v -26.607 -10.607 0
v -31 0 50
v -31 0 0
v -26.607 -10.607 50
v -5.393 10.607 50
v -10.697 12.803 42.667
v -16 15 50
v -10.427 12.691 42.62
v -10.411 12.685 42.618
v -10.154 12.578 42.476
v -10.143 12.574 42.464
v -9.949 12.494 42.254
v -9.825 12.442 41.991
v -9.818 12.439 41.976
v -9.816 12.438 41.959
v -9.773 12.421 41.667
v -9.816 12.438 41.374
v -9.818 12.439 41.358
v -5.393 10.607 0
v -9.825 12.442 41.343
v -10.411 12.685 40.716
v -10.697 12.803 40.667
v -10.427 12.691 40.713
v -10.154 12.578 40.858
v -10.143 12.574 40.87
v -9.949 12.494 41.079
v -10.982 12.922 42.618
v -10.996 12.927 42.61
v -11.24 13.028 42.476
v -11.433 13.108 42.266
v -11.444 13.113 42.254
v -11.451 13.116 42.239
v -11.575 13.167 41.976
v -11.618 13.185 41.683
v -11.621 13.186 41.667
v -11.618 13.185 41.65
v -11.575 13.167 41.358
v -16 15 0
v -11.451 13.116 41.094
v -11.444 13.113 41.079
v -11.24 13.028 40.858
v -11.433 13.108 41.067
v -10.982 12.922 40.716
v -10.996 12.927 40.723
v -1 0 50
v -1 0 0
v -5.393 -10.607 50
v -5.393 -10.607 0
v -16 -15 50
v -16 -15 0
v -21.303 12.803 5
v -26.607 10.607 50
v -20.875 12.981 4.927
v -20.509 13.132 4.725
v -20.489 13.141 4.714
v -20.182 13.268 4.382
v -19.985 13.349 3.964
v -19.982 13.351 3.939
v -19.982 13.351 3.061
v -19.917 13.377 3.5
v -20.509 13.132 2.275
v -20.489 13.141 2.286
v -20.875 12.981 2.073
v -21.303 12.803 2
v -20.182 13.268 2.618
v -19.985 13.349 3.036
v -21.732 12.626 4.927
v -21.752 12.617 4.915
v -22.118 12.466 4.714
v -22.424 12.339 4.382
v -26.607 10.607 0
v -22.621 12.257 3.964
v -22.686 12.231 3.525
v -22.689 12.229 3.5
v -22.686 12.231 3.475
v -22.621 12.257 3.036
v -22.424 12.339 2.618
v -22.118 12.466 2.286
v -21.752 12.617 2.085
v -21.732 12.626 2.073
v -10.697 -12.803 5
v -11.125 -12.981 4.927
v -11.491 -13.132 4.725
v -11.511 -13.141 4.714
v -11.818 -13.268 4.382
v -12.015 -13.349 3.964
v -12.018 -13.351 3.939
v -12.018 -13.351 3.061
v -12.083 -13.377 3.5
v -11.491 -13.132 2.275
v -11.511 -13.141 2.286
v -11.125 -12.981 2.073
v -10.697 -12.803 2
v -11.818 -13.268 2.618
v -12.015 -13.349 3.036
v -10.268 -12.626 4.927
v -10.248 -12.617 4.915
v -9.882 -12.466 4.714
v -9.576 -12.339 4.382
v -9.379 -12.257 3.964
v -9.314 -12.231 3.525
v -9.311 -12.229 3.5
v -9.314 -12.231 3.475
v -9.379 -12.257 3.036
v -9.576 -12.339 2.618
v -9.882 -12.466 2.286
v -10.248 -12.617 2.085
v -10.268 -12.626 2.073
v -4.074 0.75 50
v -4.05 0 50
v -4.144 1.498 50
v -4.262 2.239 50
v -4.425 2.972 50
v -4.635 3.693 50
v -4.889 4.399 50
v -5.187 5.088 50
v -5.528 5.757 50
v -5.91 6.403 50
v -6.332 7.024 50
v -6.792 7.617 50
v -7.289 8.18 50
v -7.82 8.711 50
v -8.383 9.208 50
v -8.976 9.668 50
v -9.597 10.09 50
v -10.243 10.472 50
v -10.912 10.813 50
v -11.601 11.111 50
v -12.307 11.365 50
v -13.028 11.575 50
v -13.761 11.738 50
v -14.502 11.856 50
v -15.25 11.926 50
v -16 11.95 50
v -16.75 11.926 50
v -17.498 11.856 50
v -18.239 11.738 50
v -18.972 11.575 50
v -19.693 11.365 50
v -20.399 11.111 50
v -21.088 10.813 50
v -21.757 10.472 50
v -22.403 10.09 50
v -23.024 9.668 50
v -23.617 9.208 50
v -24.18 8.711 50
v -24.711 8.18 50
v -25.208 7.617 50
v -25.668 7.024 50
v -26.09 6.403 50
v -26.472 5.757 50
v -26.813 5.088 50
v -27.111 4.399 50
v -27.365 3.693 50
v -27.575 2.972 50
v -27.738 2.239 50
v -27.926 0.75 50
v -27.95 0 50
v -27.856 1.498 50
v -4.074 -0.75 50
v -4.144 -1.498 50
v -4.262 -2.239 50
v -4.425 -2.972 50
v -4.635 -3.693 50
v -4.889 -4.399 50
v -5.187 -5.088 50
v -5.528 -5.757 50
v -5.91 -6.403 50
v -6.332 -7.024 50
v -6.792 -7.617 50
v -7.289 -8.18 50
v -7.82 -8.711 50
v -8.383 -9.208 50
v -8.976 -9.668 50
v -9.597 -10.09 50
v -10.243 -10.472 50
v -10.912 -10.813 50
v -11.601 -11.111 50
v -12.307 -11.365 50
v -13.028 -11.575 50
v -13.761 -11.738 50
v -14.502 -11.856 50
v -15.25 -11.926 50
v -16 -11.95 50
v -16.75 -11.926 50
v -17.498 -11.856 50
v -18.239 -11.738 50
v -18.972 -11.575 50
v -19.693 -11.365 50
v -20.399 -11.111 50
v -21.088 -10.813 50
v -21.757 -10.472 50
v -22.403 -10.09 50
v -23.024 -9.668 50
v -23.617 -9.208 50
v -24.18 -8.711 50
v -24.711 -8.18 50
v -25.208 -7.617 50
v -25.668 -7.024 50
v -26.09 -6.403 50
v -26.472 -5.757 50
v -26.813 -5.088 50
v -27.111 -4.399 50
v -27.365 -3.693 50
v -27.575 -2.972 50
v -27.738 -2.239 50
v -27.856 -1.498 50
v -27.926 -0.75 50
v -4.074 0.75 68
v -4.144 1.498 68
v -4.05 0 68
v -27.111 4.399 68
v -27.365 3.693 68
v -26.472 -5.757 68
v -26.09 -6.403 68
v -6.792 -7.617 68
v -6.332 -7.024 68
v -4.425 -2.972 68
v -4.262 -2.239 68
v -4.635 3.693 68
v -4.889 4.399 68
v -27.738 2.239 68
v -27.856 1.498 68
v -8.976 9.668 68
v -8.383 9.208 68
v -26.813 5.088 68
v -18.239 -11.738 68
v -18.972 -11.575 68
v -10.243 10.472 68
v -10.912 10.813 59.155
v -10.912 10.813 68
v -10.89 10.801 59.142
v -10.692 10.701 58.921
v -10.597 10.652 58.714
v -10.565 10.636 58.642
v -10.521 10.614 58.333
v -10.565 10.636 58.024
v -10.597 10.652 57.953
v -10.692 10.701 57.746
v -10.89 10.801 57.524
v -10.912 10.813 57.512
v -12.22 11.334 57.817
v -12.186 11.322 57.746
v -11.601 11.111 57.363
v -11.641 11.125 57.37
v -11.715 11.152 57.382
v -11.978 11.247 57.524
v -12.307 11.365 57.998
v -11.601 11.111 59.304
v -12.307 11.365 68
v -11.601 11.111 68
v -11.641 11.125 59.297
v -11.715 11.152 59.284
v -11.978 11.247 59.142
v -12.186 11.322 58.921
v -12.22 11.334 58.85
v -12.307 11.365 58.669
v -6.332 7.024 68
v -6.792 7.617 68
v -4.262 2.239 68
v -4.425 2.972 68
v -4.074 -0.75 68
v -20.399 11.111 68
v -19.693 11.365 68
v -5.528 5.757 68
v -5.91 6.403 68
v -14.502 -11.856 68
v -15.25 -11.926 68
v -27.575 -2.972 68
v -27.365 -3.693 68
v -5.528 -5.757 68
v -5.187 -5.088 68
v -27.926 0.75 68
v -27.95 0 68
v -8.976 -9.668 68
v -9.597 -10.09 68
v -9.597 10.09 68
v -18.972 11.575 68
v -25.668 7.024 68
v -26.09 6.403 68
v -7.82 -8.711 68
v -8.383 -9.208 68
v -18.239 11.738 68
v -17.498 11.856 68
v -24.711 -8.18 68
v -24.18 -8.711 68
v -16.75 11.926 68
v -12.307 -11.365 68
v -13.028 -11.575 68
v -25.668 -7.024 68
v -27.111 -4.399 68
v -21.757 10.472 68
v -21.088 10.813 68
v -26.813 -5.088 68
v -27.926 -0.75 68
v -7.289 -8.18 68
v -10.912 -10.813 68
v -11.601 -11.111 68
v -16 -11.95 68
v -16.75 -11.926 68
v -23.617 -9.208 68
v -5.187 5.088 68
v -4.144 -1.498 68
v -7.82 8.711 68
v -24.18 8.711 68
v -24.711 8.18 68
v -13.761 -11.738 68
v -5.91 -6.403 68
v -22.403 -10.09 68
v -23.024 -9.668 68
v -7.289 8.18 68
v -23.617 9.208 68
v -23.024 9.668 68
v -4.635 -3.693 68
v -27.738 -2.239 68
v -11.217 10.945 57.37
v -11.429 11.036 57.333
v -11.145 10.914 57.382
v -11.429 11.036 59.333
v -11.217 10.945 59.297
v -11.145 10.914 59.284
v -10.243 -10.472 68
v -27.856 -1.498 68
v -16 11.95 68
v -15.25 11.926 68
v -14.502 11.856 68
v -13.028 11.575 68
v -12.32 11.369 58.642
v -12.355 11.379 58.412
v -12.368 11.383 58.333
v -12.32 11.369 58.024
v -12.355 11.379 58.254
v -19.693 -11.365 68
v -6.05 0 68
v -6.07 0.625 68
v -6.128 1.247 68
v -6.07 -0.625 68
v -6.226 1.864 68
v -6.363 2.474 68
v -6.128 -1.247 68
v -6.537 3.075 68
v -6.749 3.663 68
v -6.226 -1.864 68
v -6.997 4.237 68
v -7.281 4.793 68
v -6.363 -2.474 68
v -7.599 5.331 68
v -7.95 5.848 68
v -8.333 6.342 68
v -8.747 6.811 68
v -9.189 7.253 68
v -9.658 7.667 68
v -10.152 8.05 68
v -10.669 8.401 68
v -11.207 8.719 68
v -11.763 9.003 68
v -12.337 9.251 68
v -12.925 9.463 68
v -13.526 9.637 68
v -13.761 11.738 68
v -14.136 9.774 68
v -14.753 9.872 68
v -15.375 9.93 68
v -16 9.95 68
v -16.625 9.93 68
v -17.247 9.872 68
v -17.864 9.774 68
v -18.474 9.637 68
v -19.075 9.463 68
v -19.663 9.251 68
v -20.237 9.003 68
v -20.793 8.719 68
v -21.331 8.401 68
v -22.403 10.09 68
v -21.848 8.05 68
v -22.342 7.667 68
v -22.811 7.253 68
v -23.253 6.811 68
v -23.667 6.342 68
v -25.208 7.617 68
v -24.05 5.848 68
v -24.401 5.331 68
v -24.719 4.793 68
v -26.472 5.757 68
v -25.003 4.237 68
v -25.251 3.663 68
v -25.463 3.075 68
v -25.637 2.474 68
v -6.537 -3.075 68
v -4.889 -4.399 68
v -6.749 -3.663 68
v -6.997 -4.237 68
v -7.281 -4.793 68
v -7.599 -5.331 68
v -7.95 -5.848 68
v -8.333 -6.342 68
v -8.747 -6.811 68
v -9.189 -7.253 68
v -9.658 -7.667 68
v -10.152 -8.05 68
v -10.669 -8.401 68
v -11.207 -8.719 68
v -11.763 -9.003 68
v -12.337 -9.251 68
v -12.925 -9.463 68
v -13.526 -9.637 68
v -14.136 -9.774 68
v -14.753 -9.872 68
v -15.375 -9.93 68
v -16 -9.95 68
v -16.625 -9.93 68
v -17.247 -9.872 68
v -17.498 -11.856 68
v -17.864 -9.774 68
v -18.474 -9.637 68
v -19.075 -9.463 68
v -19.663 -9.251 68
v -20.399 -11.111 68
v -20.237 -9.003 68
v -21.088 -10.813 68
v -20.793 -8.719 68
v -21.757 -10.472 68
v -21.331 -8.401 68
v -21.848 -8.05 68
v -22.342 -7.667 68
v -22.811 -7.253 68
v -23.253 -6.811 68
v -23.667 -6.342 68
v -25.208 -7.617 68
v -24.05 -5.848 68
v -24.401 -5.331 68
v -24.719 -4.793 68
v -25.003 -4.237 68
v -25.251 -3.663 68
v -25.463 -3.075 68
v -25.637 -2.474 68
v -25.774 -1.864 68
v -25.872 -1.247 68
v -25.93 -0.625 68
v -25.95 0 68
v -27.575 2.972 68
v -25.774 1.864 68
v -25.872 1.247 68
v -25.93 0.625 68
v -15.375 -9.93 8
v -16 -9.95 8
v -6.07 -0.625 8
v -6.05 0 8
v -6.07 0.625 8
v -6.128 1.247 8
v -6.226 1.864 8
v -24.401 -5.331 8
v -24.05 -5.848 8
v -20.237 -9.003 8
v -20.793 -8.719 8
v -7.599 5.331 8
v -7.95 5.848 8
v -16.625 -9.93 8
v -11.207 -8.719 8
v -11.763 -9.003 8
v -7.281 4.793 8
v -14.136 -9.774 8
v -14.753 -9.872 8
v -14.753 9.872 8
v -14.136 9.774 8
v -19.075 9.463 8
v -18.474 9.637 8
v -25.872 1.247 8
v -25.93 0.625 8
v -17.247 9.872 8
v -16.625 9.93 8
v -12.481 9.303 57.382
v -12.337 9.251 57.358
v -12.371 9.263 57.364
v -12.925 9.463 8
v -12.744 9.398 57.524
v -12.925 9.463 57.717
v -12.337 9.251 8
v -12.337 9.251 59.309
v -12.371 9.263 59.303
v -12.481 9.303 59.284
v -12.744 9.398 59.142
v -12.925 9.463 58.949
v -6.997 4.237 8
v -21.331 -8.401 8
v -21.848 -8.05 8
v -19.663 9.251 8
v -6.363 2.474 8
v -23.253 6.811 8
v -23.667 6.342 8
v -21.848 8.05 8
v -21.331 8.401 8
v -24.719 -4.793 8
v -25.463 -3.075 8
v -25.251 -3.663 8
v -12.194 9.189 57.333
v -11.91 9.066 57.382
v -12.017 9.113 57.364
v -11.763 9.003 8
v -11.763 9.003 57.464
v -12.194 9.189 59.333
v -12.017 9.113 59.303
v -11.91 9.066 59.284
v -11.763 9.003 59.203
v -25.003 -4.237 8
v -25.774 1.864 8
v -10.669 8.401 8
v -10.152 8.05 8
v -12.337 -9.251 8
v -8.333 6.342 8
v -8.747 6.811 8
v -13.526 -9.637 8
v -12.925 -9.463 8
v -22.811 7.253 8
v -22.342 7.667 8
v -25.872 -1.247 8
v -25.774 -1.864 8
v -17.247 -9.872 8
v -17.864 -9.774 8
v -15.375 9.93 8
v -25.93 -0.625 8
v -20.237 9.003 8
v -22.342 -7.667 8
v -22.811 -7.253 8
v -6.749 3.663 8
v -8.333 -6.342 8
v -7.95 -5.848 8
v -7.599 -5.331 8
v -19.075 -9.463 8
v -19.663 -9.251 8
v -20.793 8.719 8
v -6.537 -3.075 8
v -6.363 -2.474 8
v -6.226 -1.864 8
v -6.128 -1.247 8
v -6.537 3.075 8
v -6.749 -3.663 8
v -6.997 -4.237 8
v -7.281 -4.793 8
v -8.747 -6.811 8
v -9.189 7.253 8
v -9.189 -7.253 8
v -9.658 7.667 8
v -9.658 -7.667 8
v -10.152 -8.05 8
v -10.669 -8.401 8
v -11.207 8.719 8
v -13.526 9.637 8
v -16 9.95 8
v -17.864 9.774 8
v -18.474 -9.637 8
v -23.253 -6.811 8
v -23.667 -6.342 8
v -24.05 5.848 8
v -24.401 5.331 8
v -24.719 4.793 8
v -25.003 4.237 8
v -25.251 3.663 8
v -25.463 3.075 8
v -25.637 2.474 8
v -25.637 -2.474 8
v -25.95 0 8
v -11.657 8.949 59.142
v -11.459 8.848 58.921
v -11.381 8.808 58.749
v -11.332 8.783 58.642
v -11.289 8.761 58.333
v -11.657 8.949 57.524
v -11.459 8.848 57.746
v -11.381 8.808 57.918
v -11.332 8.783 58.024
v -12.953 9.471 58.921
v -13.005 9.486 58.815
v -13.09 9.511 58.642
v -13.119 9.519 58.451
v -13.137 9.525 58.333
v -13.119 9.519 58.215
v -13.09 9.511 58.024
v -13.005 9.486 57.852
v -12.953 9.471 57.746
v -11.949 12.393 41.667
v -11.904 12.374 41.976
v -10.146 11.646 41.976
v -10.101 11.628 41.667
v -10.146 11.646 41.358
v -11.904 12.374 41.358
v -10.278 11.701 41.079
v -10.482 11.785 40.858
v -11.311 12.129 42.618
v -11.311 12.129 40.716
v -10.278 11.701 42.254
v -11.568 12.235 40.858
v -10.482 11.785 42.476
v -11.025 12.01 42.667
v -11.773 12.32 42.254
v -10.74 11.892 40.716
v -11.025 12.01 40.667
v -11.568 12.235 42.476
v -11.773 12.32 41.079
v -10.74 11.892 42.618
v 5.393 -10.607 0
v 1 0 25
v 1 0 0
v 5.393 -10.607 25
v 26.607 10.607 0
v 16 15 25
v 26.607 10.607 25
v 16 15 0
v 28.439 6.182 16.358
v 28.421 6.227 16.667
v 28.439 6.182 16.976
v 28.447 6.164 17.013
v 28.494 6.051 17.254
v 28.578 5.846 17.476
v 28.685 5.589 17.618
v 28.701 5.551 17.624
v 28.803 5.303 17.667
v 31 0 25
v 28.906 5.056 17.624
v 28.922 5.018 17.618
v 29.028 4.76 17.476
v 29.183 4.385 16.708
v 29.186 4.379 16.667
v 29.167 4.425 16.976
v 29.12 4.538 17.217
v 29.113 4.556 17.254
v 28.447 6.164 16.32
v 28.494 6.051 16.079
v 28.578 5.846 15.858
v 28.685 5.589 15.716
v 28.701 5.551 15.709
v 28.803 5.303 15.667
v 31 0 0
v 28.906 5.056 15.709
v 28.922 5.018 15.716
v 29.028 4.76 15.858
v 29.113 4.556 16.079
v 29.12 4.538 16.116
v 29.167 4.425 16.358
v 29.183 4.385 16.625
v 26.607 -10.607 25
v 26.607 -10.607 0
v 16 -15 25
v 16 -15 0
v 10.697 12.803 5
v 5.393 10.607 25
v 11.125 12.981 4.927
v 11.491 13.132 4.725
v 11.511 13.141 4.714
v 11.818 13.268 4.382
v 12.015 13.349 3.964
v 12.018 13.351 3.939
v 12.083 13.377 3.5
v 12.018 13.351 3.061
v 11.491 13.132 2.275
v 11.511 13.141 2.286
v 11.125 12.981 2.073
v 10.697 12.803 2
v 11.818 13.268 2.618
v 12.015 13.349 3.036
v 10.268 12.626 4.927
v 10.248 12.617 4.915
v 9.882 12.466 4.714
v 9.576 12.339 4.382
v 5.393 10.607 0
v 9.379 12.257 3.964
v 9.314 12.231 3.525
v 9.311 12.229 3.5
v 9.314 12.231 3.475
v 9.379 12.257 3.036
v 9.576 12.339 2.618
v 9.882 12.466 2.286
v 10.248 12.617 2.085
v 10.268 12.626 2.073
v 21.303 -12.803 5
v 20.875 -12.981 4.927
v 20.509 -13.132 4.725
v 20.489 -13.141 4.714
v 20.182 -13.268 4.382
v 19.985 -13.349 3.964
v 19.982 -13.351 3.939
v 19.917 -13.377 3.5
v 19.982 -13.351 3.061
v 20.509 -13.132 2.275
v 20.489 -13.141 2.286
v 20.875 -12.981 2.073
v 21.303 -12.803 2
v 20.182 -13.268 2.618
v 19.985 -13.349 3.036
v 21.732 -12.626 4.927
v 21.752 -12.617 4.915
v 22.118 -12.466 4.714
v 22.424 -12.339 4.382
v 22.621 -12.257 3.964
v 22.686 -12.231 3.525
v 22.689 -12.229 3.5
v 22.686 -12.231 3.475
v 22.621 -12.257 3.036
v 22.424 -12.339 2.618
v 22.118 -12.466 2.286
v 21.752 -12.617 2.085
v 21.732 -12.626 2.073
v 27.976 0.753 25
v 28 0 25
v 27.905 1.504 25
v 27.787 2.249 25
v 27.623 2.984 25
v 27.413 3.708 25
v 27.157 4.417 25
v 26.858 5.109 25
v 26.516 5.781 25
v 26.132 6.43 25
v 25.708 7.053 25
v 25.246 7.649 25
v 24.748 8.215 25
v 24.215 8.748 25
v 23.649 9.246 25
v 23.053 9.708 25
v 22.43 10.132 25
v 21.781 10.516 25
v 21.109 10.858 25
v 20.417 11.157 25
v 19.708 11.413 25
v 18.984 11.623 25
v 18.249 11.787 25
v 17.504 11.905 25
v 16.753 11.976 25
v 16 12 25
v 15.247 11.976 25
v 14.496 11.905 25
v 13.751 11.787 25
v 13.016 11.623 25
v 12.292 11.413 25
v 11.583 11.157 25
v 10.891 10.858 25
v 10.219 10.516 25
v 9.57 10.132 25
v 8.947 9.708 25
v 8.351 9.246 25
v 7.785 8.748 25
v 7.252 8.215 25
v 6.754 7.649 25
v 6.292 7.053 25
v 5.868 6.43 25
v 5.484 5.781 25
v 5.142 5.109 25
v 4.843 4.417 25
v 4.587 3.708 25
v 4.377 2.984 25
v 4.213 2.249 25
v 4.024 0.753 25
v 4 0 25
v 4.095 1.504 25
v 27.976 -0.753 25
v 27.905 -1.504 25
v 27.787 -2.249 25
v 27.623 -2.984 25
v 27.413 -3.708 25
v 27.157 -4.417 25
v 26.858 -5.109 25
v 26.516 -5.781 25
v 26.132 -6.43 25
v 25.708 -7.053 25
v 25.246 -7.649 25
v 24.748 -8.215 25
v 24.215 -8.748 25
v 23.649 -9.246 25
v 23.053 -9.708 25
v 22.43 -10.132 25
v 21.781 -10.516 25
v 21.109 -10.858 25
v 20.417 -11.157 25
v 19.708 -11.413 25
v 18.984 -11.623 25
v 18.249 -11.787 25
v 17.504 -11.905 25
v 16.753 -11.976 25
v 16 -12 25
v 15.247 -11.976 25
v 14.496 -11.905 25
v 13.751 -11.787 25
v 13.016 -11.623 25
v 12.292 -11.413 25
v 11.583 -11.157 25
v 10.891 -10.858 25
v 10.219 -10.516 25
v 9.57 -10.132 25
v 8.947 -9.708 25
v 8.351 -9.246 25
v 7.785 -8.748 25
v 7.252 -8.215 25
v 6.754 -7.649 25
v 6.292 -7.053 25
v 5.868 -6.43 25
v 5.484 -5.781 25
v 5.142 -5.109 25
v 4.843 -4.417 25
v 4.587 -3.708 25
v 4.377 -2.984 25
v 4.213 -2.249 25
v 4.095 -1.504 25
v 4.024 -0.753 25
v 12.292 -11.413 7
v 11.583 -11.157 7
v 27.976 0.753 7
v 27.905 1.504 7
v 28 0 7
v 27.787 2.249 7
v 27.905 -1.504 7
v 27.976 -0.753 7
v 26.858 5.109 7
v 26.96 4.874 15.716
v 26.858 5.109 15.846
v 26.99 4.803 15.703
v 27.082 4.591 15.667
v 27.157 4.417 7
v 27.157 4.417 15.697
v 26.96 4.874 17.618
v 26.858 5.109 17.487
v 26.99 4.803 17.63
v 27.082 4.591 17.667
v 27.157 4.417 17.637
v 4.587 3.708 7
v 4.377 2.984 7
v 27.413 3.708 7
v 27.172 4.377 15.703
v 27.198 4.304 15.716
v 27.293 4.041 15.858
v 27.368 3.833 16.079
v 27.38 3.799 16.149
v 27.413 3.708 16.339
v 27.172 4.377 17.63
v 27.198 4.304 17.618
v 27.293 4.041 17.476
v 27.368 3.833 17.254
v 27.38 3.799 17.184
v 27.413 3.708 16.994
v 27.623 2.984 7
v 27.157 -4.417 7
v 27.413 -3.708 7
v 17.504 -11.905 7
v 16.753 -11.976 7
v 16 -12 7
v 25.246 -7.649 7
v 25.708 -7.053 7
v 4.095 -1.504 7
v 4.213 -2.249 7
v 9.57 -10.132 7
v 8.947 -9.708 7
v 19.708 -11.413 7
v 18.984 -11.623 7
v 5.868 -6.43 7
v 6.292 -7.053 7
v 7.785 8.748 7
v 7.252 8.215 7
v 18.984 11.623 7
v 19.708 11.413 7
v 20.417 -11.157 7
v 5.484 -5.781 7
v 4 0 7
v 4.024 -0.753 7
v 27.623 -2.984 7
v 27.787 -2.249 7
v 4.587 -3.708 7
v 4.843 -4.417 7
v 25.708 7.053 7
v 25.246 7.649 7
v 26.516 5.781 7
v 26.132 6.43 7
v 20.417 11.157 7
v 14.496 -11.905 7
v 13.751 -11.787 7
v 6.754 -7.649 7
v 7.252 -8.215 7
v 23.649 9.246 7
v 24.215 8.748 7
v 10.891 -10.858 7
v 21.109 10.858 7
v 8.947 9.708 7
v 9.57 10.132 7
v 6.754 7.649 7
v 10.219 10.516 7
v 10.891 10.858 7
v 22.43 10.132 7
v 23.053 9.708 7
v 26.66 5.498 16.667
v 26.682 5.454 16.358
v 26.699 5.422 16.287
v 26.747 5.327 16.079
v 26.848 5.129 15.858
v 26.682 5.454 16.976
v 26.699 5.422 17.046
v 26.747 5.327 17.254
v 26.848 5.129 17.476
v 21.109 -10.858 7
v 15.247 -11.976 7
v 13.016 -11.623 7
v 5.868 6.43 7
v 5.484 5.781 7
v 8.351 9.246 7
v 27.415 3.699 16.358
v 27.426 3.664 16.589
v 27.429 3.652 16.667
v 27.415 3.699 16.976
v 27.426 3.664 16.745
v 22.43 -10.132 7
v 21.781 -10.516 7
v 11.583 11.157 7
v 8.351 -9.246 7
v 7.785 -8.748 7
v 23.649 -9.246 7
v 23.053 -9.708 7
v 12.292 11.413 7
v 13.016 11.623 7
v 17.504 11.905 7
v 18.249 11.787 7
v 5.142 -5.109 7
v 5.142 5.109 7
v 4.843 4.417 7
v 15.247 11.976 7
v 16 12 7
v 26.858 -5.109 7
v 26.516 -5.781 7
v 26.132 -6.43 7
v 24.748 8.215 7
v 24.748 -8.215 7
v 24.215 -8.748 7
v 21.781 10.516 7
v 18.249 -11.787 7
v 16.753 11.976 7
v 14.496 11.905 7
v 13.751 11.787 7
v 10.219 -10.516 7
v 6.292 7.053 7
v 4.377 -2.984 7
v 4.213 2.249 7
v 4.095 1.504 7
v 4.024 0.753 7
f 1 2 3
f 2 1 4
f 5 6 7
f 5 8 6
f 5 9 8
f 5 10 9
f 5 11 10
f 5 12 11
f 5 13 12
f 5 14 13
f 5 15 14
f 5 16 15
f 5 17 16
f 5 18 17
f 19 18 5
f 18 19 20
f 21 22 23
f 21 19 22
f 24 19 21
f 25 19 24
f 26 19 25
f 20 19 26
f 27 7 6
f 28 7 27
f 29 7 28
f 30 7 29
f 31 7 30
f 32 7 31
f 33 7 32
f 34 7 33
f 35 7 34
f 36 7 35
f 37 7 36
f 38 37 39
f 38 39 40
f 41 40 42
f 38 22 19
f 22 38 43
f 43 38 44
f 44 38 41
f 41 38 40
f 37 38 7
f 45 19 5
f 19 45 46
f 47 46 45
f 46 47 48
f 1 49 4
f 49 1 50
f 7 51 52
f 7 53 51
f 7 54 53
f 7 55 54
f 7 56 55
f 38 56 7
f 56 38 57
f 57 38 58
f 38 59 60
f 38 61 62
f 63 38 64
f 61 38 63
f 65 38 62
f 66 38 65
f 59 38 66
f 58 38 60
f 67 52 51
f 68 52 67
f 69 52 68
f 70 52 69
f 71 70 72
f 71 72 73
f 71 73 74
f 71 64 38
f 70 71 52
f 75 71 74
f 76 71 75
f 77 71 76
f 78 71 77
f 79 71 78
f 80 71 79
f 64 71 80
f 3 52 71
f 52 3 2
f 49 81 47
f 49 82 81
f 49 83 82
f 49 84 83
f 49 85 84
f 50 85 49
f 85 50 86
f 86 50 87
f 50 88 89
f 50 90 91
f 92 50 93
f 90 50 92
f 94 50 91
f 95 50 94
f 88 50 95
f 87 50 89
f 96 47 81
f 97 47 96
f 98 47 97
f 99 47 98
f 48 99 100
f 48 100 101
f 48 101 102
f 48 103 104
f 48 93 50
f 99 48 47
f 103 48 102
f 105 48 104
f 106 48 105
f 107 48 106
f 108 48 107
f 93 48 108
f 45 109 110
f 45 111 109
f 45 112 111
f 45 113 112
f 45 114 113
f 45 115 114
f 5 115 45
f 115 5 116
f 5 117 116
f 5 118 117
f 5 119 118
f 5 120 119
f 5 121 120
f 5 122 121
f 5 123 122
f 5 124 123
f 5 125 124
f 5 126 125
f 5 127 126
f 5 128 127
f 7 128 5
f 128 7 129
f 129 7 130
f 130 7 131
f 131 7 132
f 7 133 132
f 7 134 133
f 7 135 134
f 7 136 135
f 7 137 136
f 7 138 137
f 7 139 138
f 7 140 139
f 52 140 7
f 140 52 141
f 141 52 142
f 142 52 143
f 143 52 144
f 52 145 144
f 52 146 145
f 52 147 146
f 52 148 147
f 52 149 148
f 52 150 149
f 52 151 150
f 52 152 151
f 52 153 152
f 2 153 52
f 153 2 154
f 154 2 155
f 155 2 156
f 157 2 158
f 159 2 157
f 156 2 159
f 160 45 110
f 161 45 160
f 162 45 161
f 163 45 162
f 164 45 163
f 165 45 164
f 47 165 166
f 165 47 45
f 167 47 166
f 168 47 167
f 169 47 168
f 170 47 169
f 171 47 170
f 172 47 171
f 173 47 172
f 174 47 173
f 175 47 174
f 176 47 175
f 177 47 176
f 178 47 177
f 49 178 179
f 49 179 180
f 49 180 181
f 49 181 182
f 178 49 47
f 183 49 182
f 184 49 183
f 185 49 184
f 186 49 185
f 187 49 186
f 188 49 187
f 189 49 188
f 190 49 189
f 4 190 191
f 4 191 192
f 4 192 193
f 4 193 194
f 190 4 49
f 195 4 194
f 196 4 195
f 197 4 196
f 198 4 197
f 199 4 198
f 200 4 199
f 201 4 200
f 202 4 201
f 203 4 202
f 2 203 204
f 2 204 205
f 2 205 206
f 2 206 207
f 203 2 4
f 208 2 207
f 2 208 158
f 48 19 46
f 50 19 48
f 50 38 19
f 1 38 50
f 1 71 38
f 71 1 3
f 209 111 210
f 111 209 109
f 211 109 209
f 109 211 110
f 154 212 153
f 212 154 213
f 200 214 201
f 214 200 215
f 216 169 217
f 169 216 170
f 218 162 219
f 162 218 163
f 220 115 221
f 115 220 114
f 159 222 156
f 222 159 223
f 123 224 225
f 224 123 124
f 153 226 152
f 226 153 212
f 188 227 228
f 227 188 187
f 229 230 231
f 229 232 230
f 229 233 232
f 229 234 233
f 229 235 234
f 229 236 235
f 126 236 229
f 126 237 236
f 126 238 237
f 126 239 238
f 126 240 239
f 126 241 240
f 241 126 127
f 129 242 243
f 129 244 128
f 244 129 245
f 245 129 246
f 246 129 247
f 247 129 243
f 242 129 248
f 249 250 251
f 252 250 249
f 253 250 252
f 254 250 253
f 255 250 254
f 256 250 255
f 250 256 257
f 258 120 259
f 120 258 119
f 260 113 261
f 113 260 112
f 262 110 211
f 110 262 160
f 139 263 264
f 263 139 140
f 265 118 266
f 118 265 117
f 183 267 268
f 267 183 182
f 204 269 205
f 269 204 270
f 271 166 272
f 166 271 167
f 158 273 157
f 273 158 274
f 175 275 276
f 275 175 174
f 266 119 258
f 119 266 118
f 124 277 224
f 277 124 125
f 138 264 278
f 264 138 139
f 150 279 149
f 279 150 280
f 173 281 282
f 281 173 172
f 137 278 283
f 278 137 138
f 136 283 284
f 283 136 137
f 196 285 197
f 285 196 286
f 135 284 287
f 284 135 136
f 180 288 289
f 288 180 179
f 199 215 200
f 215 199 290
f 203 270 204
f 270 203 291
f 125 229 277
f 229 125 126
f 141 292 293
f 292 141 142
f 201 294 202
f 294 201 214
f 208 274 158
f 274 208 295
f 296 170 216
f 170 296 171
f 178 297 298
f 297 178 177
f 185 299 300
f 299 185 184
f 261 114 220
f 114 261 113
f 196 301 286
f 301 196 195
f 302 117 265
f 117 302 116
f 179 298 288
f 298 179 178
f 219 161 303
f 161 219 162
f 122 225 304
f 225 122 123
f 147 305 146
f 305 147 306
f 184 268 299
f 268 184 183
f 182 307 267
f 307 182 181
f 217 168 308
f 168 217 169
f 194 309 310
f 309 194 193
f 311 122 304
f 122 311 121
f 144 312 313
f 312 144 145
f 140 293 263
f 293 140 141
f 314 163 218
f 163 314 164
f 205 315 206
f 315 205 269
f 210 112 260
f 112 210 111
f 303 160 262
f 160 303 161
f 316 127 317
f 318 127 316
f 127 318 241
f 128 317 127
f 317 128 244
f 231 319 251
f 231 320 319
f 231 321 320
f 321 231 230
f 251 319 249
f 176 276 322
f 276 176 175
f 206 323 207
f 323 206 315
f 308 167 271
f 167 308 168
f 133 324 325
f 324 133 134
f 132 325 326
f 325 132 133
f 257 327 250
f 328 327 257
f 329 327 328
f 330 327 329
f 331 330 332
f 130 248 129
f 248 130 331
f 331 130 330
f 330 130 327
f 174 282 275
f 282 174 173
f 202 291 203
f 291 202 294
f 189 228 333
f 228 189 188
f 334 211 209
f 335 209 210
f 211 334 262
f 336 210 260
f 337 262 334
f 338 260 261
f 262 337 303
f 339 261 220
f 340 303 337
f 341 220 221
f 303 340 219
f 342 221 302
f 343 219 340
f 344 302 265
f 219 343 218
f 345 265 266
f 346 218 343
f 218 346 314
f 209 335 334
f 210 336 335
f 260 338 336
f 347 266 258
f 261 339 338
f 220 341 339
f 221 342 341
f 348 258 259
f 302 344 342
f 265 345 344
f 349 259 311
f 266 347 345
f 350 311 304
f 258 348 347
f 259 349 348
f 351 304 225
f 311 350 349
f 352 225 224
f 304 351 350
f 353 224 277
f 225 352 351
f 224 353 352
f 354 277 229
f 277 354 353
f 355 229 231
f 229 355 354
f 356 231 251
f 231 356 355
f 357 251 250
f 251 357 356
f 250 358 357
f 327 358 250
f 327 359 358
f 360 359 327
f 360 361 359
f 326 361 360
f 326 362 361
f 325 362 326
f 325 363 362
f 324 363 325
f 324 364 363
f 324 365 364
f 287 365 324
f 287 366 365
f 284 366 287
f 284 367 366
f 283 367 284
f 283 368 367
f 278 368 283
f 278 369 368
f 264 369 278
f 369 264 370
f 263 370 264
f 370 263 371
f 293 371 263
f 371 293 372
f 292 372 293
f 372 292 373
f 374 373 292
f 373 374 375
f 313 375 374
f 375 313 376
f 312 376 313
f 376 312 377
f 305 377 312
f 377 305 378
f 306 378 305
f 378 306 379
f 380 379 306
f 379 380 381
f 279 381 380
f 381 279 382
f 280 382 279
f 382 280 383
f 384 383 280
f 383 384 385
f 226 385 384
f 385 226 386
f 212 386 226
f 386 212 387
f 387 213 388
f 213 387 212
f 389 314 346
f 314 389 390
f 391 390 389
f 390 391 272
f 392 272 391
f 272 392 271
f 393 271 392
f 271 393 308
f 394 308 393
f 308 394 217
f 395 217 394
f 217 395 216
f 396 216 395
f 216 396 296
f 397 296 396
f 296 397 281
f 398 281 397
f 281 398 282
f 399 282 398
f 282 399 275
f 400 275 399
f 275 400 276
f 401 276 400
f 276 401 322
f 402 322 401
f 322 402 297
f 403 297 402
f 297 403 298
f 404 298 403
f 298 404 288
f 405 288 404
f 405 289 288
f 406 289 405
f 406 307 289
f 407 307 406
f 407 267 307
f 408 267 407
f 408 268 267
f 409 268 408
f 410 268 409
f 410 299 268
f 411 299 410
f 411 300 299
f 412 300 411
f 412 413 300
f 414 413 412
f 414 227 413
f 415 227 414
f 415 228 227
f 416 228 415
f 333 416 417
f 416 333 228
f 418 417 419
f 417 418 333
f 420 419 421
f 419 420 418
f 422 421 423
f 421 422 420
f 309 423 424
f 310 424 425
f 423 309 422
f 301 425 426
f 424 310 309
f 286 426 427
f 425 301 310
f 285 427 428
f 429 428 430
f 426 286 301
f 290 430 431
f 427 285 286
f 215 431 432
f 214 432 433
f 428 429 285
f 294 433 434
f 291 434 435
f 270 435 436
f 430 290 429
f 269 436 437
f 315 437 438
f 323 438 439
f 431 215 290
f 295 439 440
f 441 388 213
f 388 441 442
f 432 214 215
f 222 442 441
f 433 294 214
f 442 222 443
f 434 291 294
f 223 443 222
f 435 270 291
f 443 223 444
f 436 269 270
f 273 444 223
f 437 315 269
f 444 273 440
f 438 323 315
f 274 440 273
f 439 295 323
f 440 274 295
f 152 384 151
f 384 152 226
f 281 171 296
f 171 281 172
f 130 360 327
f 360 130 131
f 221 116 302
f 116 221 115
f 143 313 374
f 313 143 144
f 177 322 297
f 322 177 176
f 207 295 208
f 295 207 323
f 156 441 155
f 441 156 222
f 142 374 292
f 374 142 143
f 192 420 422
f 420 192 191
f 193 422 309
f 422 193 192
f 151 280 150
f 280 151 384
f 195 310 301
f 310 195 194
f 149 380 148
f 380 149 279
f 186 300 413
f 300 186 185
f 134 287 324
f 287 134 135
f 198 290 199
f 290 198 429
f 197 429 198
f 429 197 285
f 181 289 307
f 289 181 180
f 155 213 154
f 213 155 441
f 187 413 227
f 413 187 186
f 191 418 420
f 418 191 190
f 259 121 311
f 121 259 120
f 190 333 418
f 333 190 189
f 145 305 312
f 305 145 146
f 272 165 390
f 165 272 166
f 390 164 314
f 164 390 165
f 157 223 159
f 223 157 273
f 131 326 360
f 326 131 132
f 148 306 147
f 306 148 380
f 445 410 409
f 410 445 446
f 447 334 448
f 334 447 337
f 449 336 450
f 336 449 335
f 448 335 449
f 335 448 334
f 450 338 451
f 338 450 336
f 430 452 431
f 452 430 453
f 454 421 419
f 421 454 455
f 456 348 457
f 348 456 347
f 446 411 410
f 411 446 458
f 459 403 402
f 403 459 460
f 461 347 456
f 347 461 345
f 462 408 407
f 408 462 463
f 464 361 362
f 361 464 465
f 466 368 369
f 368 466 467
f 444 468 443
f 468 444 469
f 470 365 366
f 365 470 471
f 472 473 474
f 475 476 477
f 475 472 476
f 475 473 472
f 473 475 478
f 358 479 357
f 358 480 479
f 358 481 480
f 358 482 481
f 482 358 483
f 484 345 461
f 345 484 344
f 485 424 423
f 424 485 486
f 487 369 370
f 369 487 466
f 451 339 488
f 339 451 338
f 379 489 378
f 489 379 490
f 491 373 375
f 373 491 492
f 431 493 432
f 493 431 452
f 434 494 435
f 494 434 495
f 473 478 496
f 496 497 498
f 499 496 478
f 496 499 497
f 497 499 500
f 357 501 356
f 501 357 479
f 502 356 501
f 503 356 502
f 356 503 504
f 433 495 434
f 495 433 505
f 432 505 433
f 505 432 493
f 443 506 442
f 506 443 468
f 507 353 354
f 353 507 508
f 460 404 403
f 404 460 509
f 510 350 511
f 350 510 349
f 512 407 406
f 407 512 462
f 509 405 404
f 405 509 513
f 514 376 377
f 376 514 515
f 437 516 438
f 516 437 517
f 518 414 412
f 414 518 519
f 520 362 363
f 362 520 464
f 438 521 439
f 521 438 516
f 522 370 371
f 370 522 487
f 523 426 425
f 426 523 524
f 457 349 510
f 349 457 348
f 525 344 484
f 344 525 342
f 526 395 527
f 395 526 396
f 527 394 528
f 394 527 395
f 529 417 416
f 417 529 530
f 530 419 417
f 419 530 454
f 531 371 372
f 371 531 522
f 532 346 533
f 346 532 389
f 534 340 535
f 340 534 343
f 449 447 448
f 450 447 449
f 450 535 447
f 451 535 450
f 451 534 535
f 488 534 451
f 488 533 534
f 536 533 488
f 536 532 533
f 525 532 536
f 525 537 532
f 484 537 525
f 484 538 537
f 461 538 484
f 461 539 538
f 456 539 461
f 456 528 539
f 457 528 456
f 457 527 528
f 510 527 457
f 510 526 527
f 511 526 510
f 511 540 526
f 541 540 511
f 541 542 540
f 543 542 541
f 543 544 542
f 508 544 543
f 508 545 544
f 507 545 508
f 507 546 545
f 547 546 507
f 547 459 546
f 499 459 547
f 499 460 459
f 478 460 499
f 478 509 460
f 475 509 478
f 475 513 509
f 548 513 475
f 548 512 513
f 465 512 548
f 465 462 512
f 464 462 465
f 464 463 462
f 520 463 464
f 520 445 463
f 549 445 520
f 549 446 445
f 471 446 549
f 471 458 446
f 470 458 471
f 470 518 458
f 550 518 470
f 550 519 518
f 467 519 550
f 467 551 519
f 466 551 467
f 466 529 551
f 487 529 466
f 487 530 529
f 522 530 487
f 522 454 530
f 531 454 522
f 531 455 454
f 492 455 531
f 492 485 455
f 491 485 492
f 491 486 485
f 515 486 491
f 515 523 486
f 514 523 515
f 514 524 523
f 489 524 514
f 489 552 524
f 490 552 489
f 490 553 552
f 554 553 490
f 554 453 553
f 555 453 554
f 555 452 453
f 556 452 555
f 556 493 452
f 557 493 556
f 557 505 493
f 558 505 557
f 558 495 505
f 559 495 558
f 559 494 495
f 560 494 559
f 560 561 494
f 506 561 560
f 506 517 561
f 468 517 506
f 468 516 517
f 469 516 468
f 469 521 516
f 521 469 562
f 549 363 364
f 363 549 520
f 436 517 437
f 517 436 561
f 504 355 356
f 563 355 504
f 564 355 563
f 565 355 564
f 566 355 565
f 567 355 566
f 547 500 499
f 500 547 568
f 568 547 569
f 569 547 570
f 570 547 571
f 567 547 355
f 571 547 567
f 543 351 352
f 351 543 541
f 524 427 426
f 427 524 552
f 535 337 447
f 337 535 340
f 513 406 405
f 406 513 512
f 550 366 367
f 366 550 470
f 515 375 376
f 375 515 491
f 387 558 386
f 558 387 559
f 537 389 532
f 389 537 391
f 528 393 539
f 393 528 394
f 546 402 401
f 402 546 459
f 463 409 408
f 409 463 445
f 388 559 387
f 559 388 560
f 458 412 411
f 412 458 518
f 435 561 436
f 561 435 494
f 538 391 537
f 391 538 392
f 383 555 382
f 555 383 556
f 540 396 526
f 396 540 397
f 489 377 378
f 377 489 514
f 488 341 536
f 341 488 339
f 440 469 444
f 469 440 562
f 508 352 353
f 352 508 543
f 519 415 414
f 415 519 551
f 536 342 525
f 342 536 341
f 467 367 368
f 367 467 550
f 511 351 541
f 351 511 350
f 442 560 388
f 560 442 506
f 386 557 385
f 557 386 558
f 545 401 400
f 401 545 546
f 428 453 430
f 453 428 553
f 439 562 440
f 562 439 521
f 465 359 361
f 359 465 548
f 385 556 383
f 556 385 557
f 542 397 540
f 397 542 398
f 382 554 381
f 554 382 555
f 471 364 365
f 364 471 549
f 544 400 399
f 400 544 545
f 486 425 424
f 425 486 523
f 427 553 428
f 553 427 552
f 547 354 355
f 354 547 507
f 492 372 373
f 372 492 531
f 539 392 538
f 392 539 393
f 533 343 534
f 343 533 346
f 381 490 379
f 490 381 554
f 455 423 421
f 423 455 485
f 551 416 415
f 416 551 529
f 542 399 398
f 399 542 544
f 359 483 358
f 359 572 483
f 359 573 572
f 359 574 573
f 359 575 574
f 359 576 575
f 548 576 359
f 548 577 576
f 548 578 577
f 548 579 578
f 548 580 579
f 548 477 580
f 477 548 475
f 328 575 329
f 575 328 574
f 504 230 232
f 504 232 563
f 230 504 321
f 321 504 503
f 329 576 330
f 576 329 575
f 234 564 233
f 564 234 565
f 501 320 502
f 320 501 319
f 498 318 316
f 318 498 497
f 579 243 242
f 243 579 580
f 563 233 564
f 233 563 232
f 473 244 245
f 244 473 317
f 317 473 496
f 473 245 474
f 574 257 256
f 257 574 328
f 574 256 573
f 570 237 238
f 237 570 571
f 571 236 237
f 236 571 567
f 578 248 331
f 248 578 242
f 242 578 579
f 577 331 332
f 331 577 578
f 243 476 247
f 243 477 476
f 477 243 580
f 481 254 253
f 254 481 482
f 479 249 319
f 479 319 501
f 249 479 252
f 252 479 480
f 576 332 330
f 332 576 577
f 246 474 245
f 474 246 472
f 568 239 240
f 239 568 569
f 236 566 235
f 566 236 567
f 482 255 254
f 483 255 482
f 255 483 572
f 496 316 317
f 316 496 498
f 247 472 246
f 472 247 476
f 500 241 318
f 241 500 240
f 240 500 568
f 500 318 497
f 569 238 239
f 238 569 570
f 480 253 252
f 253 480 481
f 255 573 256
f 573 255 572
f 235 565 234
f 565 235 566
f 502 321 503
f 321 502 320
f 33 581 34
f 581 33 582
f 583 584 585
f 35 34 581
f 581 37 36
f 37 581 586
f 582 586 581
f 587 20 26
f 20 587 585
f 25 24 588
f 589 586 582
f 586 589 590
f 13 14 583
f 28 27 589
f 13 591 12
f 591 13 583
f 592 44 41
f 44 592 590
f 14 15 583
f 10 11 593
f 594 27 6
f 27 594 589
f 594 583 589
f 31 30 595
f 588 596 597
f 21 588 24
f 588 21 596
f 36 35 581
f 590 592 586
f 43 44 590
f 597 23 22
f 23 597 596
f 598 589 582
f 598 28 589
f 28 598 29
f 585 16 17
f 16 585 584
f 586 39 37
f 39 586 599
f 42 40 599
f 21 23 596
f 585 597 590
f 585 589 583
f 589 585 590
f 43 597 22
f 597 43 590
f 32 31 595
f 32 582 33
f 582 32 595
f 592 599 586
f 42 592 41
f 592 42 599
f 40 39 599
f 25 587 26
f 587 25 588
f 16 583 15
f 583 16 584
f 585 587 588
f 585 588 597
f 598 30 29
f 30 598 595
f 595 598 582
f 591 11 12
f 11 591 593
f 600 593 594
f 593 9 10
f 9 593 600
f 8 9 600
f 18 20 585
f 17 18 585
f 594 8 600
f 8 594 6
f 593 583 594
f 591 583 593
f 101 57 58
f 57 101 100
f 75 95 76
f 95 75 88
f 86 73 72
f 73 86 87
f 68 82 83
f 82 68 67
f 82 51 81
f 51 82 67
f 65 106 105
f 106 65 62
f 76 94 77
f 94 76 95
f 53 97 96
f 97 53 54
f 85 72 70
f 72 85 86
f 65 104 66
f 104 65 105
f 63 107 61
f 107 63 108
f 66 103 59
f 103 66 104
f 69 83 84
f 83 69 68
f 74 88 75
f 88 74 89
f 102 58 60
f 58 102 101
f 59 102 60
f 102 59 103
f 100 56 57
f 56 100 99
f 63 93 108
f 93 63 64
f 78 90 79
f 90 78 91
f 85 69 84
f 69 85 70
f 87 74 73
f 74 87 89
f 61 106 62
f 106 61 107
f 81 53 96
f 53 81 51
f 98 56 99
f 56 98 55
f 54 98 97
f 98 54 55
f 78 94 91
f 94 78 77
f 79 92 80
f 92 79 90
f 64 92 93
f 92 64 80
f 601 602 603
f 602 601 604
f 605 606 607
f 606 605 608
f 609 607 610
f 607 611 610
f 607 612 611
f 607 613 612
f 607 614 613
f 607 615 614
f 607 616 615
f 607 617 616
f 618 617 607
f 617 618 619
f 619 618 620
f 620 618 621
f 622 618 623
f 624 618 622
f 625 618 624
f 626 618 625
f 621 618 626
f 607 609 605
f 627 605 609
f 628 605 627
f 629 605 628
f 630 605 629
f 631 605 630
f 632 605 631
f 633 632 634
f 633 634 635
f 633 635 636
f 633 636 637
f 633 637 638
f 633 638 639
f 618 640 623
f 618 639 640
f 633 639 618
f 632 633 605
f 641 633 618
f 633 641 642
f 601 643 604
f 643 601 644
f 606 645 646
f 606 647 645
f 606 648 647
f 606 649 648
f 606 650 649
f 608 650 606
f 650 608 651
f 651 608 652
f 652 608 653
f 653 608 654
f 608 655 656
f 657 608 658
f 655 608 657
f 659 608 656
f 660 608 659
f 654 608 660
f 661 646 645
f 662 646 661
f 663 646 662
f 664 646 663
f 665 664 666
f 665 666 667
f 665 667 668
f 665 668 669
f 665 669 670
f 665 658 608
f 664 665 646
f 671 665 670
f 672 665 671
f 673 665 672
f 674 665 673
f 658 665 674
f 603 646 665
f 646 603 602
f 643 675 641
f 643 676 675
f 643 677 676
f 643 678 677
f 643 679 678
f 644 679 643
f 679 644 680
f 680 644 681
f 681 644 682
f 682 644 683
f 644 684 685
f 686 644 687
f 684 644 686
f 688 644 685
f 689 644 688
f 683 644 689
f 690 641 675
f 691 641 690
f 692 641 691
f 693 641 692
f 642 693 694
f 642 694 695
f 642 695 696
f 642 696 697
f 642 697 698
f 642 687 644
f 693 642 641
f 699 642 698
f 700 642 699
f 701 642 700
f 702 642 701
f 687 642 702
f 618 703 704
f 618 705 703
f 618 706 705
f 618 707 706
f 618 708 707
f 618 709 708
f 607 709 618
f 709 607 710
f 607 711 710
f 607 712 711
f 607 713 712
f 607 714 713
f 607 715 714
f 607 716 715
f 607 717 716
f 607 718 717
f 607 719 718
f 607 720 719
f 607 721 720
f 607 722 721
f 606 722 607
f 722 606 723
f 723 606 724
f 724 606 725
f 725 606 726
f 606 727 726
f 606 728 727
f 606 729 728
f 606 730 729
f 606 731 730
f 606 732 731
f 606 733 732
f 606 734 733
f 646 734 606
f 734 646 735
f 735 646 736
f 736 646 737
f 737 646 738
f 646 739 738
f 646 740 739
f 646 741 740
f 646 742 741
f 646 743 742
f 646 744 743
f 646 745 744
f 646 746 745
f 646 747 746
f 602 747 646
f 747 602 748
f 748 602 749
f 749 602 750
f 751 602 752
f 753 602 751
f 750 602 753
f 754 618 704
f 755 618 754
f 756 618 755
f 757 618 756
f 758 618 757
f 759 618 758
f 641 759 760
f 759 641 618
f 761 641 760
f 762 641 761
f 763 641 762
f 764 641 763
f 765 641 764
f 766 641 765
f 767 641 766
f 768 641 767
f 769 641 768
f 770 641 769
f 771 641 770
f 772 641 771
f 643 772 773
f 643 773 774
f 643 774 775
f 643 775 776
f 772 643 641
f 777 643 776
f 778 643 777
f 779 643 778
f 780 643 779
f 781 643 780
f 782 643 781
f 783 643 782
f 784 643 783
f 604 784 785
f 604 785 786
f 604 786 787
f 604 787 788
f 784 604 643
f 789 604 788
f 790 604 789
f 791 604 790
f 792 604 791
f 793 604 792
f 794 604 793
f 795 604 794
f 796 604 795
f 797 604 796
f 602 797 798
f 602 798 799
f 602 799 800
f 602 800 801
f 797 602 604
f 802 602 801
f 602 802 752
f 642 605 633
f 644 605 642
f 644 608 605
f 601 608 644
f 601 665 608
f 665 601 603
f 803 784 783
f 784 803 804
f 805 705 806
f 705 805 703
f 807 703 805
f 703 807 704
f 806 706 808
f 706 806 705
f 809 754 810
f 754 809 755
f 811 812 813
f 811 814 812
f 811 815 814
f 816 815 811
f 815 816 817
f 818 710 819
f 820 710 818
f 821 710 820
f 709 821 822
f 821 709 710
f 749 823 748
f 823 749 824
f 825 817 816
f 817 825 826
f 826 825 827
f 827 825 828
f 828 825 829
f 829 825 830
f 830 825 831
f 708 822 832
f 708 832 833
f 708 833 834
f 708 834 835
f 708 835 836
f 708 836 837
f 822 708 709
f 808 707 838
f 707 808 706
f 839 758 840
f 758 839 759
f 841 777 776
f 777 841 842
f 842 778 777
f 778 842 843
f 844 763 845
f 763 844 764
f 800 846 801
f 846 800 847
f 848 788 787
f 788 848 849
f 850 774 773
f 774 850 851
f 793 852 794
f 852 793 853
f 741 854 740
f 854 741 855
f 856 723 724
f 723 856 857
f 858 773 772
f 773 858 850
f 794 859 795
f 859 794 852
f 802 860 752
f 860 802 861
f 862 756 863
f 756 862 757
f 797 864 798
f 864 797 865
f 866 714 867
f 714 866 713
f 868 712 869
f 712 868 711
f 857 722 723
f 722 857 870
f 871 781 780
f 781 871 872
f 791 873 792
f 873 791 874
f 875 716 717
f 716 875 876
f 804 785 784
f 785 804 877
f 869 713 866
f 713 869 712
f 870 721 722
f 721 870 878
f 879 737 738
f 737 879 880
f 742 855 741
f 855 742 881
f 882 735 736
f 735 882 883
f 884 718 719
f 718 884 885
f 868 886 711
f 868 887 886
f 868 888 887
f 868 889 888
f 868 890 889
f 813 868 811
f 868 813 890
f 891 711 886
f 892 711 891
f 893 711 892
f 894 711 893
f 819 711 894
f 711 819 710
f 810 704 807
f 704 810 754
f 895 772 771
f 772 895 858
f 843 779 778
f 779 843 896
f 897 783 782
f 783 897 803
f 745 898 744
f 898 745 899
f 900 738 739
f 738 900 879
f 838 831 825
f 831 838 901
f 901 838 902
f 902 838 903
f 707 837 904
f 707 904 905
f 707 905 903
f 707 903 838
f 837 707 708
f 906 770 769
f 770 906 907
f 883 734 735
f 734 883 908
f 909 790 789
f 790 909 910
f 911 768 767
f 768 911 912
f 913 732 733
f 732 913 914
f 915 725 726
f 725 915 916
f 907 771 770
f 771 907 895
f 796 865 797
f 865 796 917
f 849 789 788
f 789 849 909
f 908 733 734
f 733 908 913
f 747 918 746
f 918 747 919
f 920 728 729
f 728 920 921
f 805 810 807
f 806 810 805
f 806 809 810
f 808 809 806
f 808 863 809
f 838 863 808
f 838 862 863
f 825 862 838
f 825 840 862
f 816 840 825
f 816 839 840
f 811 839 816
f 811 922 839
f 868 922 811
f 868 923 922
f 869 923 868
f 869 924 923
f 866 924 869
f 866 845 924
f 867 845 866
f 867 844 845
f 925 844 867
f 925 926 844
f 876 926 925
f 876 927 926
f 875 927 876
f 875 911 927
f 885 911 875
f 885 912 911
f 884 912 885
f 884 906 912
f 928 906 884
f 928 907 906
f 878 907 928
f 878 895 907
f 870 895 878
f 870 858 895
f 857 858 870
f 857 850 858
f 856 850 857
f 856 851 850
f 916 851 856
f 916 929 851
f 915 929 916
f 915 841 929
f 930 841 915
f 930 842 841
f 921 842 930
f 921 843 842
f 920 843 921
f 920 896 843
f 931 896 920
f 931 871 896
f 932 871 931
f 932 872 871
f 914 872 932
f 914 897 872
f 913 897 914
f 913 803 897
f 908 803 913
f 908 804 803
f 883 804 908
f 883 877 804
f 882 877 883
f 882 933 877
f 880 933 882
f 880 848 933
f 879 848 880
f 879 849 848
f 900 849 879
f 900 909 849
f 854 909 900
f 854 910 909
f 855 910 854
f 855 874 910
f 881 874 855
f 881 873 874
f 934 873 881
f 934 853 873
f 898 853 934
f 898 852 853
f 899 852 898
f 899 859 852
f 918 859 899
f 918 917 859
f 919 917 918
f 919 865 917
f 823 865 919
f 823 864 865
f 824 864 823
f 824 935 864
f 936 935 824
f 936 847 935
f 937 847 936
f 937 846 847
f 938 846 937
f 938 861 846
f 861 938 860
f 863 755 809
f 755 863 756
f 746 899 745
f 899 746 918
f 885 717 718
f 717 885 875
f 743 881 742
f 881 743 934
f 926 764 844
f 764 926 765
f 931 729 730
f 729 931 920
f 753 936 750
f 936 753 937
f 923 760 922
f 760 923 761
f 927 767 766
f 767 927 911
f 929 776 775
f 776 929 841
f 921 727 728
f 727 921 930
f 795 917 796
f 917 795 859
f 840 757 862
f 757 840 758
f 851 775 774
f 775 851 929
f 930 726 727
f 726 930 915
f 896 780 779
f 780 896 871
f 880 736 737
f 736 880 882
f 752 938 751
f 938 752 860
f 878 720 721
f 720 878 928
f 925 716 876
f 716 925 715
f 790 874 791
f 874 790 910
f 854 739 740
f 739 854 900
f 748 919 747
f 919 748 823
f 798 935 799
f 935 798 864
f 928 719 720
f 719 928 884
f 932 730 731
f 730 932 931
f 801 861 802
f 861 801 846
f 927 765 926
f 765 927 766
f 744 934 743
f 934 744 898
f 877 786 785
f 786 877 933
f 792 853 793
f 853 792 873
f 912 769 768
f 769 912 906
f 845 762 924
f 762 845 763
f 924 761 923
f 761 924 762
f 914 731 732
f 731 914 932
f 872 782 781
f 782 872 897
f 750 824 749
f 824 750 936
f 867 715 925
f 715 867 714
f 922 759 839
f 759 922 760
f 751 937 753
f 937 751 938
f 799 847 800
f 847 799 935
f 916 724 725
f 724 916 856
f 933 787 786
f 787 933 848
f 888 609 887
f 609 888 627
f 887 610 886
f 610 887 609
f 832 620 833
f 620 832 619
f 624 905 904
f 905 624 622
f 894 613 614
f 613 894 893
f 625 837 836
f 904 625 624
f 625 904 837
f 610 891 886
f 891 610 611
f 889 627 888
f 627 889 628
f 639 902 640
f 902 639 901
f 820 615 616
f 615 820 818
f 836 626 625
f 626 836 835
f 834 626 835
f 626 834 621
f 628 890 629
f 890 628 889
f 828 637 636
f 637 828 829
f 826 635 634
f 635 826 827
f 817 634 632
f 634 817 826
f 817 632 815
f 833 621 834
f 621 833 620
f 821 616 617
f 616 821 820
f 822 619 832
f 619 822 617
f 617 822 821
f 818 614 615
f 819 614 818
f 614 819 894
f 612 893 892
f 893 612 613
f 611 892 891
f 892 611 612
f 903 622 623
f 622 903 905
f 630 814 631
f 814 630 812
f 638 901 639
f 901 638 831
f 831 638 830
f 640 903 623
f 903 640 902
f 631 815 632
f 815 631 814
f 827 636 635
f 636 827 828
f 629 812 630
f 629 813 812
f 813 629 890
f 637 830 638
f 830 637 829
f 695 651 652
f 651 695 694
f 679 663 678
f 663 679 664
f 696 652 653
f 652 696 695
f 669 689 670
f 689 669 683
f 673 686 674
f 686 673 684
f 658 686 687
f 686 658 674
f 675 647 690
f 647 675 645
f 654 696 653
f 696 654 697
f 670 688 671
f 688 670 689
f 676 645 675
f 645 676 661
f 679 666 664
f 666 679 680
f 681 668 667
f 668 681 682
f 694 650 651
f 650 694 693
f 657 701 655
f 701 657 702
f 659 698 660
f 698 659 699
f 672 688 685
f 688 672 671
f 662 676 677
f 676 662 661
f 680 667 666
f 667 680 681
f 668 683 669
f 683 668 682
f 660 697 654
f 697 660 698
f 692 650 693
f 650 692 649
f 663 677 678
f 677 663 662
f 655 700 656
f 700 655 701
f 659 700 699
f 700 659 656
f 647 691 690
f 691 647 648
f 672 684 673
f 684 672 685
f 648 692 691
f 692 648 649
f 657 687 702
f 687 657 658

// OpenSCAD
// [FL_INDEX: keywords="openscad, 3d_parametric, Kyudo_Powder_Containers__Fudeko-ire_and_Giriko-ire, csg_solid" | COT="Parametric OpenSCAD design from 3DCodeverse"]
// Title: Kyudo Powder Containers, Fudeko-ire and Giriko-ire

// Which parts would you like to see?
part = "both"; // [container:Container Only,lid:Lid Only,both:Both Container and Lid]

// What type of container would you like to make?
variant = 30; // [22:Giriko-ire(22mm),30:Fudeko-ire(30mm),35:Large Fudeko-ire(35mm)]
variant_radius=variant/2;

// How many sides?
shape = 8; // [8:Eight sides,12:Twelve sides,100:Round]

// How thick should the walls be? (mm)
wall_thickness = 2; // [1:4]

// Diameter of the string hole. (mm)
string_hole_diameter = 3; // [0:No hole,1:1mm,1.5:1.5mm,2:2mm,3:3mm,4:4mm,5:5mm]

// Diameter of the hole.
hole_diameter = 2; // [0:No hole,1:1mm,1.5:1.5mm,2:2mm,3:3mm,4:4mm,5:5mm]

// How much tolerance between the lid and container?
tolerance = 0.05; // [0.05,0.06,0.07,0.08,0.09,0.1,0.15,0.2,0.3,0.4,0.5]

angle_between_holes = shape==100?45:(360/shape);

half_angle_between_holes=angle_between_holes/2;

hole_radius = hole_diameter==0?0:hole_diameter/2;
string_hole_radius = string_hole_diameter==0?0:string_hole_diameter/2;

height = variant*2.5;
segment = height/3;
overlap = segment-(string_hole_diameter+4);


print_part();

module print_part() {
	if (part == "container") {
		container();
	} else if (part == "lid") {
		lid();
	} else if (part == "both") {
		both();
	} else {
		both();
	}
}

module both() {
	translate([-(variant_radius+1), 0, 0]) container();
	translate([variant_radius+1, 0, 0]) lid();
}

module container() {
	difference(){
		union(){
			//outer shape
			cylinder(r=variant_radius, h=segment*2, $fn=shape); 
			//overlap cylinder
			translate([0, 0, segment*2]) cylinder(r=variant_radius-(wall_thickness+1+tolerance), h=overlap, $fn=100);
		}
		// inside of container
		translate([0, 0, string_hole_diameter+5])cylinder(r=variant_radius-(wall_thickness+1+tolerance)-2, h=(segment*2)+overlap+2, $fn=100);
		// hole
		translate([0, 0, segment*2+(segment/3)]) rotate([90,0,half_angle_between_holes+angle_between_holes+90]) cylinder(r=hole_radius, h=variant_radius+1, $fn=20);
		// marker
		translate([0, 0, segment*2-(segment/3)]) rotate([90,0,half_angle_between_holes+angle_between_holes+90]) translate([0,0,variant_radius-2]) cylinder(r=hole_radius, h=variant_radius+1, $fn=20);
		// string hole
		translate([0, 0, string_hole_radius+2]) rotate([90,0,half_angle_between_holes]) cylinder(r=string_hole_radius, h=variant+1,center=true, $fn=20);

	}
}

module lid() {
	difference(){
		// outer shape
		cylinder(r=variant_radius, h=segment, $fn=shape);
		// cut-out cylinder
		translate([0, 0, string_hole_diameter+4]) cylinder(r=variant_radius-(wall_thickness+1), h=overlap+1, $fn=100);
		// hole 
		translate([0, 0, segment/3*2]) rotate([90,0,half_angle_between_holes+90]) cylinder(r=hole_radius, h=variant_radius+1, $fn=20);
		// string hole
		translate([0, 0, string_hole_radius+2]) rotate([90,0,half_angle_between_holes]) cylinder(r=string_hole_radius, h=variant+1,center=true, $fn=20);
	}
}
